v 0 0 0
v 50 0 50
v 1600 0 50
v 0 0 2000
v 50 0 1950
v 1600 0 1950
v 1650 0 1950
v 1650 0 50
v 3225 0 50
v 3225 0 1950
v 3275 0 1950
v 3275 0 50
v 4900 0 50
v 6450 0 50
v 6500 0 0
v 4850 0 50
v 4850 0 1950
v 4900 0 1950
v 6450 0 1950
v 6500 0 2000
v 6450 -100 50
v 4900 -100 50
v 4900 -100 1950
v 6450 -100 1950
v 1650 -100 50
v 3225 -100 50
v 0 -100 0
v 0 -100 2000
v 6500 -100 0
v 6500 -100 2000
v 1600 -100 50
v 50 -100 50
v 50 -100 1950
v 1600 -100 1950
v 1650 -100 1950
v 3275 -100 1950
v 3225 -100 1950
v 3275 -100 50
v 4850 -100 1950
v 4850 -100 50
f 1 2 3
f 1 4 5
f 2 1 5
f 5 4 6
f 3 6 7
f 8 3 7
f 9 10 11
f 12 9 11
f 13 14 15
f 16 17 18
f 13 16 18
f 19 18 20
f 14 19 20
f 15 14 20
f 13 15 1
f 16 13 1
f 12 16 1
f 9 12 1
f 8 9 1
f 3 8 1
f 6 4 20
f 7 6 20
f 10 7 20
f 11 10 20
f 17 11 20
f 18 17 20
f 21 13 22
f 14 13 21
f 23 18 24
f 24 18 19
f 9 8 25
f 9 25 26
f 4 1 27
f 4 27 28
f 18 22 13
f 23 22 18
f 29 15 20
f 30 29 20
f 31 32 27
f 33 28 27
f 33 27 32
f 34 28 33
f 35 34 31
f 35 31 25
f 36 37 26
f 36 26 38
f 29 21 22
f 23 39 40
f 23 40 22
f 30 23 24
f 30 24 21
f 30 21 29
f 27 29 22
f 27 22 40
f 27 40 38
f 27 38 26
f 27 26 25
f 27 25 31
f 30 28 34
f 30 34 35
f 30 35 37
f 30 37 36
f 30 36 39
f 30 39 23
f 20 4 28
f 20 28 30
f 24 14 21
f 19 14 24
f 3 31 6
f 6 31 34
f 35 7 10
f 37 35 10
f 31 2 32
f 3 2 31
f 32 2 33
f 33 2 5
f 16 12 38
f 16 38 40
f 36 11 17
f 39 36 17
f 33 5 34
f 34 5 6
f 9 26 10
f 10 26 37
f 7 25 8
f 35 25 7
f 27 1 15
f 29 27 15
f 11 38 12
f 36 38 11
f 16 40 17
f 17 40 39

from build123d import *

# Parameters (mm, degrees)
F0_W     = 6500
F0_H     = 2000
F0_W_2   = 6400
F0_H_2   = 1900
F1_DEPTH = 100
F2_W     = 50
F2_H     = 1900
F3_DEPTH = 100
F4_W     = 50
F4_H     = 1900
F5_DEPTH = 100
F6_W     = 50
F6_H     = 1900
F7_DEPTH = 100


with BuildPart() as f1:
    # F0 (on Front) → F1 (new body)
    with BuildSketch(Plane.XZ):
        with Locations((3250, 1000)):
            Rectangle(F0_W, F0_H)
        with Locations((3250, 1000)):
            Rectangle(F0_W_2, F0_H_2, mode=Mode.SUBTRACT)
    extrude(amount=F1_DEPTH)

    # F2 (on face) → F3 (join)
    with BuildSketch(Plane.XZ.offset(100)):
        with Locations((1625, 1000)):
            Rectangle(F2_W, F2_H)
    extrude(amount=-F3_DEPTH)

    # F4 (on face) → F5 (join)
    with BuildSketch(Plane.XZ.offset(100)):
        with Locations((3250, 1000)):
            Rectangle(F4_W, F4_H)
    extrude(amount=-F5_DEPTH)

    # F6 (on face) → F7 (join)
    with BuildSketch(Plane.XZ.offset(100)):
        with Locations((4875, 1000)):
            Rectangle(F6_W, F6_H)
    extrude(amount=-F7_DEPTH)


solid = f1.part
